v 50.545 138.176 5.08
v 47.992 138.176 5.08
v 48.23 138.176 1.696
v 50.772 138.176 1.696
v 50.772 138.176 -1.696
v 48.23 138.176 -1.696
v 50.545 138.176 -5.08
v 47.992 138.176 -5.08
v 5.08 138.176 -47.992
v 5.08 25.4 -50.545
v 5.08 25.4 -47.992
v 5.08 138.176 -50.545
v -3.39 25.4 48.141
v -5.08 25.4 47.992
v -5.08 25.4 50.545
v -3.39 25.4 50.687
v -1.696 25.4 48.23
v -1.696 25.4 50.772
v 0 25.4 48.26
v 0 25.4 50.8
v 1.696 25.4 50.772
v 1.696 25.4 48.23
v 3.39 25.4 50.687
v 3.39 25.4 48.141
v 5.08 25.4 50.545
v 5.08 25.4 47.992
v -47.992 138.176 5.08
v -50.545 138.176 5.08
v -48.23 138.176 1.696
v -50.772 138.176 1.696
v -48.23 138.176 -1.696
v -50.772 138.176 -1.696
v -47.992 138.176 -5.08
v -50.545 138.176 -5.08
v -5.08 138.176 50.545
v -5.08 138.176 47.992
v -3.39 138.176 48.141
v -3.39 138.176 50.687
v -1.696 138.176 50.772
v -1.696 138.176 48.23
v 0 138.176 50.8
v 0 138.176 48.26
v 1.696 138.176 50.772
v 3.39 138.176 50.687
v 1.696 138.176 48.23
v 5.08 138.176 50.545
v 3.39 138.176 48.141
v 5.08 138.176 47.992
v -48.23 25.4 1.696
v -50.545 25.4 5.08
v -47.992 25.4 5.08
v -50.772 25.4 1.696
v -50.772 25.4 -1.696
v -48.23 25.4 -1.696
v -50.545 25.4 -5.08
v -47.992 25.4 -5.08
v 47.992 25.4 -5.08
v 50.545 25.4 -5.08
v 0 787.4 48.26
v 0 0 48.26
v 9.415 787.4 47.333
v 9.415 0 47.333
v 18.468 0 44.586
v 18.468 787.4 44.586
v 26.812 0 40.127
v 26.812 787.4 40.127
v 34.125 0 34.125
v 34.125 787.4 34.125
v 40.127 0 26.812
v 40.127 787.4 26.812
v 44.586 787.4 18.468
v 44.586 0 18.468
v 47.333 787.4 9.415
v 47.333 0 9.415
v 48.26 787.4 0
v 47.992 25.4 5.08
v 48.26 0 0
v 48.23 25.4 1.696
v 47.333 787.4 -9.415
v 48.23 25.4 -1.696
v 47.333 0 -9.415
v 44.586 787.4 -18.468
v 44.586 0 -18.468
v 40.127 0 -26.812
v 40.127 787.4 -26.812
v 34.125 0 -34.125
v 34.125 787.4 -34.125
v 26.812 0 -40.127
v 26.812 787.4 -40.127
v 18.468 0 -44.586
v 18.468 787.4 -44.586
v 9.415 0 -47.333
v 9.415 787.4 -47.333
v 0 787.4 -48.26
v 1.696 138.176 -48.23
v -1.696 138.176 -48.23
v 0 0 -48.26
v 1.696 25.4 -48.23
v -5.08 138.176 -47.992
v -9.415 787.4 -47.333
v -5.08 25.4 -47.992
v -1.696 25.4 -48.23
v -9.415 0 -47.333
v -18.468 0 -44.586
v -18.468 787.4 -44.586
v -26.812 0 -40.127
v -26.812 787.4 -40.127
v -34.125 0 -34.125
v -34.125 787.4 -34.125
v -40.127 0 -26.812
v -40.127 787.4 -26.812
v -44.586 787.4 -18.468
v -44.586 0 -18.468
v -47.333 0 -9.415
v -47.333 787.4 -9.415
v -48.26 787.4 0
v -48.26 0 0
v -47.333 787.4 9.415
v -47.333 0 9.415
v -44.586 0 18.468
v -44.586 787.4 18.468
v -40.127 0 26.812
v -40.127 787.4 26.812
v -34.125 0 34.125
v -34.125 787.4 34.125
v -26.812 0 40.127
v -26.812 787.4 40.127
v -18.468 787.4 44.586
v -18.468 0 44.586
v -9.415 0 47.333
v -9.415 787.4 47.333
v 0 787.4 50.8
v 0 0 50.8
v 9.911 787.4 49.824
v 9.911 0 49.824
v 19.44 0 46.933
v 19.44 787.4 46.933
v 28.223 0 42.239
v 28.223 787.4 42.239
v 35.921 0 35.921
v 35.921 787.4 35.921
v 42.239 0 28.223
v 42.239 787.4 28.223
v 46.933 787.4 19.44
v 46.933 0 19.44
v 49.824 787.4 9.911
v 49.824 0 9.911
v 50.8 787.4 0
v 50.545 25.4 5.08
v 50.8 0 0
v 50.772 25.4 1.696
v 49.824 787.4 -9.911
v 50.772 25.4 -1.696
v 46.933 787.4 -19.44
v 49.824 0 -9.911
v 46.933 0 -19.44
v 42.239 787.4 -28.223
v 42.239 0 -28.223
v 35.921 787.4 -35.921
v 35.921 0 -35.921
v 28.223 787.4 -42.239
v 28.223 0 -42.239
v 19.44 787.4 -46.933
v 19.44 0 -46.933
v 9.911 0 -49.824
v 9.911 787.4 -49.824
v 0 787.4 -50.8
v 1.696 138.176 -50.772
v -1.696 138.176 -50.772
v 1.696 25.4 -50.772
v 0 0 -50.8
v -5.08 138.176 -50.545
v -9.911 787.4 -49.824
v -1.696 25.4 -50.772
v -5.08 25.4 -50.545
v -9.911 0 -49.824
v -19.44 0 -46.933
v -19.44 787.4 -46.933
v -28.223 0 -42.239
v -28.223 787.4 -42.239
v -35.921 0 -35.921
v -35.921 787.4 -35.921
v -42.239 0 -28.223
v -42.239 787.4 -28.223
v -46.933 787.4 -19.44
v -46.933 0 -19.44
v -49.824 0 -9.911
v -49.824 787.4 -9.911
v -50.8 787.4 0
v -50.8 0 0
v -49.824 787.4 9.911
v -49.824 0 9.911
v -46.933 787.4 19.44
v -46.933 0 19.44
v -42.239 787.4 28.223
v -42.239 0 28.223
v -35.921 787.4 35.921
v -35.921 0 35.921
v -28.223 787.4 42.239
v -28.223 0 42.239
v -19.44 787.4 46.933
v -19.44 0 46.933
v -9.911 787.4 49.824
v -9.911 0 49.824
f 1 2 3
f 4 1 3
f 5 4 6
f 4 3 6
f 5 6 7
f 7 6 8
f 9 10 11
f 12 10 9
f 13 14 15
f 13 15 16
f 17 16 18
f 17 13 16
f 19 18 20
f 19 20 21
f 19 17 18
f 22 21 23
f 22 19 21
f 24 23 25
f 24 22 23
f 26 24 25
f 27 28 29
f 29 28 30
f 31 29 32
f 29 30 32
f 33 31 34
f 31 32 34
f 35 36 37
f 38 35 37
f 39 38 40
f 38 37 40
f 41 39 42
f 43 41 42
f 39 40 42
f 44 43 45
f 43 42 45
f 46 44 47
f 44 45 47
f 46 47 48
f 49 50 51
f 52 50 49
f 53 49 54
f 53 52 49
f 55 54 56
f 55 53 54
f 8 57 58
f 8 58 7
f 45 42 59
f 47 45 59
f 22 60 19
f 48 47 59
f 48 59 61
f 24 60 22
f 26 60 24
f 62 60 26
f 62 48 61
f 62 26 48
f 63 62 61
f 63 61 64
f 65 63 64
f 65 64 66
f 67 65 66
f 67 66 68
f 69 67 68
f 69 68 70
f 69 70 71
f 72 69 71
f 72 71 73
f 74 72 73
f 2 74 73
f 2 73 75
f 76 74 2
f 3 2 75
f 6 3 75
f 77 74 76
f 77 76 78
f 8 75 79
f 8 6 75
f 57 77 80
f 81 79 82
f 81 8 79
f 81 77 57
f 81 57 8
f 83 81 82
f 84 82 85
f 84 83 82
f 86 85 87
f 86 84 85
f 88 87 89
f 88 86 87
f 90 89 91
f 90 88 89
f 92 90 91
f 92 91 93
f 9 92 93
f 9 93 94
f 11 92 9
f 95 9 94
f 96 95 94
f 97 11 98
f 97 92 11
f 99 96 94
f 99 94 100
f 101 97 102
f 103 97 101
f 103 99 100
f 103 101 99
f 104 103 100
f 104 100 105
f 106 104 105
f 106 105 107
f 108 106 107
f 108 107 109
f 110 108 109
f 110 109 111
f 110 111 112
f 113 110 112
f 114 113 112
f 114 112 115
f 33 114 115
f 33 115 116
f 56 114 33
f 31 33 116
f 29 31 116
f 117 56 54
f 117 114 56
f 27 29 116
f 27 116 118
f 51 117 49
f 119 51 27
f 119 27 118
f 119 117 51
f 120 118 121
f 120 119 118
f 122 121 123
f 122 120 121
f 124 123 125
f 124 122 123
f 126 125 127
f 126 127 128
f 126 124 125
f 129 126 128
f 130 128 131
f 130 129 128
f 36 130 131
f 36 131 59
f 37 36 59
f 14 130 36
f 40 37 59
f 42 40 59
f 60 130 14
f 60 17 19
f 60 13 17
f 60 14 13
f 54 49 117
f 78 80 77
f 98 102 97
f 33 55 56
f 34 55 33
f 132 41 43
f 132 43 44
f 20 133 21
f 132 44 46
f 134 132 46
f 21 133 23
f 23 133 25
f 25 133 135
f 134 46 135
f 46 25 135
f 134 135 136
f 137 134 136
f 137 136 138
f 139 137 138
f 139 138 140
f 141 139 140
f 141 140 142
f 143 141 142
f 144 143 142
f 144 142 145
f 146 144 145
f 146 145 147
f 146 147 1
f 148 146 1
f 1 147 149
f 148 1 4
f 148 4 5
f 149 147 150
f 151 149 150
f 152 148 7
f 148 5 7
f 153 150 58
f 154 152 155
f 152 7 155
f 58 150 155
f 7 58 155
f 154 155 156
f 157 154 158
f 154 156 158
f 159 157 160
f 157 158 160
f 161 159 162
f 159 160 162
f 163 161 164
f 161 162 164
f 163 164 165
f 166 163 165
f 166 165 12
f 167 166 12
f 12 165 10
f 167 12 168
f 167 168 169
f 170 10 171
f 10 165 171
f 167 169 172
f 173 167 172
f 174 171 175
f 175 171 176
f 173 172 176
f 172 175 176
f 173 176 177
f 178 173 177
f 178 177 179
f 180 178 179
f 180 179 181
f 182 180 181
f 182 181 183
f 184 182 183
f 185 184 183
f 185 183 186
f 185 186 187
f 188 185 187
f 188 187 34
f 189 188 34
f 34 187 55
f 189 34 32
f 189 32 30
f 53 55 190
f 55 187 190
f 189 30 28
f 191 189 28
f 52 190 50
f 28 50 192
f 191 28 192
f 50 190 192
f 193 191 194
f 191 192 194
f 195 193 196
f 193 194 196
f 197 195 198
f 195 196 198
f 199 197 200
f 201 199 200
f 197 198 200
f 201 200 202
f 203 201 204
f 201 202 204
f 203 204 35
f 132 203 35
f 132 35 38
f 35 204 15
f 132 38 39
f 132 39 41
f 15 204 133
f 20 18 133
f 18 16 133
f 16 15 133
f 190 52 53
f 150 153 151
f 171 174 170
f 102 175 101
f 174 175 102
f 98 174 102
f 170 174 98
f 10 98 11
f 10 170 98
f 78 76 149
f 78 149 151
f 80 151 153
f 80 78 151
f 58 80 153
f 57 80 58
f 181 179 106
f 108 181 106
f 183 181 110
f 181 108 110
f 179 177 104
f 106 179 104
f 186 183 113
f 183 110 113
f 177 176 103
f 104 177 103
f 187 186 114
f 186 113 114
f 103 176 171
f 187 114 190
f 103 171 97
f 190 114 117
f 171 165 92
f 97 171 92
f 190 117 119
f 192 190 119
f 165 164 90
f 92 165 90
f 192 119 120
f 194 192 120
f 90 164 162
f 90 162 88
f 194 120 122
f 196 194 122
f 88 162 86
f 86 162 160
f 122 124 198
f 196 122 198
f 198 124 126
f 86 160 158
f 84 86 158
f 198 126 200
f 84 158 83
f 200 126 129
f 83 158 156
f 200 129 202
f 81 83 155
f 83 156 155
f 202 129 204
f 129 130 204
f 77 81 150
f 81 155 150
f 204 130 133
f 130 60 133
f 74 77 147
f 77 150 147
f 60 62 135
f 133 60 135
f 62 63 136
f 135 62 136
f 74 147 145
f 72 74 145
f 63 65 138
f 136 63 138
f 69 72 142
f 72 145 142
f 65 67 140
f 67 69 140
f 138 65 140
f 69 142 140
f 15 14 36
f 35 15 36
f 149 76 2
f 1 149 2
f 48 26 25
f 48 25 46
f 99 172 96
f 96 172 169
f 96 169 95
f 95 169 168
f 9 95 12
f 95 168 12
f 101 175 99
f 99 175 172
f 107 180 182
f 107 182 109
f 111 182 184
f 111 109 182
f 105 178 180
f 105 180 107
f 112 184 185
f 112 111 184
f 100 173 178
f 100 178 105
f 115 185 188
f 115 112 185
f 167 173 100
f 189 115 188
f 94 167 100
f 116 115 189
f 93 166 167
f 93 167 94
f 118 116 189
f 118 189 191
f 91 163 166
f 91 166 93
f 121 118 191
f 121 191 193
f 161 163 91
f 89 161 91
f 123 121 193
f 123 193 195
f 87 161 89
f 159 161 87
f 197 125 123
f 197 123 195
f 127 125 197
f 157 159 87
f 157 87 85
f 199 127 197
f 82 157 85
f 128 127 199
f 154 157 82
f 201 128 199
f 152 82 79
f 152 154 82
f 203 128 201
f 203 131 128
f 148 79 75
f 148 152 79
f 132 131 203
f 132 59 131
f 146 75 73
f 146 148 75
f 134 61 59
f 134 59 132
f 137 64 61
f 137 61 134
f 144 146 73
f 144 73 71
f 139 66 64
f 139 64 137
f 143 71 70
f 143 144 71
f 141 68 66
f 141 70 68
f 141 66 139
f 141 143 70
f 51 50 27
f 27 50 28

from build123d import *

# Parameters (mm, degrees)
SKETCH1_R               = 50.8
SKETCH1_R_2             = 48.26
BOSS_EXTRUDE1_DEPTH     = 787.4
CUT_EXTRUDE1_DEPTH      = 791.670626747
CUT_EXTRUDE1_DEPTH_BACK = 791.670626747
SKETCH2_W               = 10.16
SKETCH2_H               = 112.776
CUT_EXTRUDE2_DEPTH      = 791.670626747
CUT_EXTRUDE2_DEPTH_BACK = 791.670626747
SKETCH3_W               = 10.16
SKETCH3_H               = 112.776


with BuildPart() as part:
    # Sketch1 → Boss-Extrude1 (new body)
    with BuildSketch(Plane(origin=(0, 0, 0), x_dir=(1, 0, 0), z_dir=(0, 1, 0))):
        with Locations(Location((0, 0, 0), (0, 0, 270))):
            Circle(SKETCH1_R)
        with Locations(Location((0, 0, 0), (0, 0, 270))):
            Circle(SKETCH1_R_2, mode=Mode.SUBTRACT)
    extrude(amount=BOSS_EXTRUDE1_DEPTH)

    # Sketch2 → Cut-Extrude1 (cut, two sides: drawn at the far end of the back side and taken through both)
    with BuildSketch(Plane.XY.offset(-CUT_EXTRUDE1_DEPTH_BACK)):
        with Locations((0, 81.788)):
            Rectangle(SKETCH2_W, SKETCH2_H)
    extrude(amount=CUT_EXTRUDE1_DEPTH + CUT_EXTRUDE1_DEPTH_BACK, mode=Mode.SUBTRACT)

    # Sketch3 → Cut-Extrude2 (cut, two sides: drawn at the far end of the back side and taken through both)
    with BuildSketch(Plane(origin=(0, 0, 0), x_dir=(0, 0, -1), z_dir=(1, 0, 0)).offset(-CUT_EXTRUDE2_DEPTH_BACK)):
        with Locations((0, 81.788)):
            Rectangle(SKETCH3_W, SKETCH3_H)
    extrude(amount=CUT_EXTRUDE2_DEPTH + CUT_EXTRUDE2_DEPTH_BACK, mode=Mode.SUBTRACT)


solid = part.part
